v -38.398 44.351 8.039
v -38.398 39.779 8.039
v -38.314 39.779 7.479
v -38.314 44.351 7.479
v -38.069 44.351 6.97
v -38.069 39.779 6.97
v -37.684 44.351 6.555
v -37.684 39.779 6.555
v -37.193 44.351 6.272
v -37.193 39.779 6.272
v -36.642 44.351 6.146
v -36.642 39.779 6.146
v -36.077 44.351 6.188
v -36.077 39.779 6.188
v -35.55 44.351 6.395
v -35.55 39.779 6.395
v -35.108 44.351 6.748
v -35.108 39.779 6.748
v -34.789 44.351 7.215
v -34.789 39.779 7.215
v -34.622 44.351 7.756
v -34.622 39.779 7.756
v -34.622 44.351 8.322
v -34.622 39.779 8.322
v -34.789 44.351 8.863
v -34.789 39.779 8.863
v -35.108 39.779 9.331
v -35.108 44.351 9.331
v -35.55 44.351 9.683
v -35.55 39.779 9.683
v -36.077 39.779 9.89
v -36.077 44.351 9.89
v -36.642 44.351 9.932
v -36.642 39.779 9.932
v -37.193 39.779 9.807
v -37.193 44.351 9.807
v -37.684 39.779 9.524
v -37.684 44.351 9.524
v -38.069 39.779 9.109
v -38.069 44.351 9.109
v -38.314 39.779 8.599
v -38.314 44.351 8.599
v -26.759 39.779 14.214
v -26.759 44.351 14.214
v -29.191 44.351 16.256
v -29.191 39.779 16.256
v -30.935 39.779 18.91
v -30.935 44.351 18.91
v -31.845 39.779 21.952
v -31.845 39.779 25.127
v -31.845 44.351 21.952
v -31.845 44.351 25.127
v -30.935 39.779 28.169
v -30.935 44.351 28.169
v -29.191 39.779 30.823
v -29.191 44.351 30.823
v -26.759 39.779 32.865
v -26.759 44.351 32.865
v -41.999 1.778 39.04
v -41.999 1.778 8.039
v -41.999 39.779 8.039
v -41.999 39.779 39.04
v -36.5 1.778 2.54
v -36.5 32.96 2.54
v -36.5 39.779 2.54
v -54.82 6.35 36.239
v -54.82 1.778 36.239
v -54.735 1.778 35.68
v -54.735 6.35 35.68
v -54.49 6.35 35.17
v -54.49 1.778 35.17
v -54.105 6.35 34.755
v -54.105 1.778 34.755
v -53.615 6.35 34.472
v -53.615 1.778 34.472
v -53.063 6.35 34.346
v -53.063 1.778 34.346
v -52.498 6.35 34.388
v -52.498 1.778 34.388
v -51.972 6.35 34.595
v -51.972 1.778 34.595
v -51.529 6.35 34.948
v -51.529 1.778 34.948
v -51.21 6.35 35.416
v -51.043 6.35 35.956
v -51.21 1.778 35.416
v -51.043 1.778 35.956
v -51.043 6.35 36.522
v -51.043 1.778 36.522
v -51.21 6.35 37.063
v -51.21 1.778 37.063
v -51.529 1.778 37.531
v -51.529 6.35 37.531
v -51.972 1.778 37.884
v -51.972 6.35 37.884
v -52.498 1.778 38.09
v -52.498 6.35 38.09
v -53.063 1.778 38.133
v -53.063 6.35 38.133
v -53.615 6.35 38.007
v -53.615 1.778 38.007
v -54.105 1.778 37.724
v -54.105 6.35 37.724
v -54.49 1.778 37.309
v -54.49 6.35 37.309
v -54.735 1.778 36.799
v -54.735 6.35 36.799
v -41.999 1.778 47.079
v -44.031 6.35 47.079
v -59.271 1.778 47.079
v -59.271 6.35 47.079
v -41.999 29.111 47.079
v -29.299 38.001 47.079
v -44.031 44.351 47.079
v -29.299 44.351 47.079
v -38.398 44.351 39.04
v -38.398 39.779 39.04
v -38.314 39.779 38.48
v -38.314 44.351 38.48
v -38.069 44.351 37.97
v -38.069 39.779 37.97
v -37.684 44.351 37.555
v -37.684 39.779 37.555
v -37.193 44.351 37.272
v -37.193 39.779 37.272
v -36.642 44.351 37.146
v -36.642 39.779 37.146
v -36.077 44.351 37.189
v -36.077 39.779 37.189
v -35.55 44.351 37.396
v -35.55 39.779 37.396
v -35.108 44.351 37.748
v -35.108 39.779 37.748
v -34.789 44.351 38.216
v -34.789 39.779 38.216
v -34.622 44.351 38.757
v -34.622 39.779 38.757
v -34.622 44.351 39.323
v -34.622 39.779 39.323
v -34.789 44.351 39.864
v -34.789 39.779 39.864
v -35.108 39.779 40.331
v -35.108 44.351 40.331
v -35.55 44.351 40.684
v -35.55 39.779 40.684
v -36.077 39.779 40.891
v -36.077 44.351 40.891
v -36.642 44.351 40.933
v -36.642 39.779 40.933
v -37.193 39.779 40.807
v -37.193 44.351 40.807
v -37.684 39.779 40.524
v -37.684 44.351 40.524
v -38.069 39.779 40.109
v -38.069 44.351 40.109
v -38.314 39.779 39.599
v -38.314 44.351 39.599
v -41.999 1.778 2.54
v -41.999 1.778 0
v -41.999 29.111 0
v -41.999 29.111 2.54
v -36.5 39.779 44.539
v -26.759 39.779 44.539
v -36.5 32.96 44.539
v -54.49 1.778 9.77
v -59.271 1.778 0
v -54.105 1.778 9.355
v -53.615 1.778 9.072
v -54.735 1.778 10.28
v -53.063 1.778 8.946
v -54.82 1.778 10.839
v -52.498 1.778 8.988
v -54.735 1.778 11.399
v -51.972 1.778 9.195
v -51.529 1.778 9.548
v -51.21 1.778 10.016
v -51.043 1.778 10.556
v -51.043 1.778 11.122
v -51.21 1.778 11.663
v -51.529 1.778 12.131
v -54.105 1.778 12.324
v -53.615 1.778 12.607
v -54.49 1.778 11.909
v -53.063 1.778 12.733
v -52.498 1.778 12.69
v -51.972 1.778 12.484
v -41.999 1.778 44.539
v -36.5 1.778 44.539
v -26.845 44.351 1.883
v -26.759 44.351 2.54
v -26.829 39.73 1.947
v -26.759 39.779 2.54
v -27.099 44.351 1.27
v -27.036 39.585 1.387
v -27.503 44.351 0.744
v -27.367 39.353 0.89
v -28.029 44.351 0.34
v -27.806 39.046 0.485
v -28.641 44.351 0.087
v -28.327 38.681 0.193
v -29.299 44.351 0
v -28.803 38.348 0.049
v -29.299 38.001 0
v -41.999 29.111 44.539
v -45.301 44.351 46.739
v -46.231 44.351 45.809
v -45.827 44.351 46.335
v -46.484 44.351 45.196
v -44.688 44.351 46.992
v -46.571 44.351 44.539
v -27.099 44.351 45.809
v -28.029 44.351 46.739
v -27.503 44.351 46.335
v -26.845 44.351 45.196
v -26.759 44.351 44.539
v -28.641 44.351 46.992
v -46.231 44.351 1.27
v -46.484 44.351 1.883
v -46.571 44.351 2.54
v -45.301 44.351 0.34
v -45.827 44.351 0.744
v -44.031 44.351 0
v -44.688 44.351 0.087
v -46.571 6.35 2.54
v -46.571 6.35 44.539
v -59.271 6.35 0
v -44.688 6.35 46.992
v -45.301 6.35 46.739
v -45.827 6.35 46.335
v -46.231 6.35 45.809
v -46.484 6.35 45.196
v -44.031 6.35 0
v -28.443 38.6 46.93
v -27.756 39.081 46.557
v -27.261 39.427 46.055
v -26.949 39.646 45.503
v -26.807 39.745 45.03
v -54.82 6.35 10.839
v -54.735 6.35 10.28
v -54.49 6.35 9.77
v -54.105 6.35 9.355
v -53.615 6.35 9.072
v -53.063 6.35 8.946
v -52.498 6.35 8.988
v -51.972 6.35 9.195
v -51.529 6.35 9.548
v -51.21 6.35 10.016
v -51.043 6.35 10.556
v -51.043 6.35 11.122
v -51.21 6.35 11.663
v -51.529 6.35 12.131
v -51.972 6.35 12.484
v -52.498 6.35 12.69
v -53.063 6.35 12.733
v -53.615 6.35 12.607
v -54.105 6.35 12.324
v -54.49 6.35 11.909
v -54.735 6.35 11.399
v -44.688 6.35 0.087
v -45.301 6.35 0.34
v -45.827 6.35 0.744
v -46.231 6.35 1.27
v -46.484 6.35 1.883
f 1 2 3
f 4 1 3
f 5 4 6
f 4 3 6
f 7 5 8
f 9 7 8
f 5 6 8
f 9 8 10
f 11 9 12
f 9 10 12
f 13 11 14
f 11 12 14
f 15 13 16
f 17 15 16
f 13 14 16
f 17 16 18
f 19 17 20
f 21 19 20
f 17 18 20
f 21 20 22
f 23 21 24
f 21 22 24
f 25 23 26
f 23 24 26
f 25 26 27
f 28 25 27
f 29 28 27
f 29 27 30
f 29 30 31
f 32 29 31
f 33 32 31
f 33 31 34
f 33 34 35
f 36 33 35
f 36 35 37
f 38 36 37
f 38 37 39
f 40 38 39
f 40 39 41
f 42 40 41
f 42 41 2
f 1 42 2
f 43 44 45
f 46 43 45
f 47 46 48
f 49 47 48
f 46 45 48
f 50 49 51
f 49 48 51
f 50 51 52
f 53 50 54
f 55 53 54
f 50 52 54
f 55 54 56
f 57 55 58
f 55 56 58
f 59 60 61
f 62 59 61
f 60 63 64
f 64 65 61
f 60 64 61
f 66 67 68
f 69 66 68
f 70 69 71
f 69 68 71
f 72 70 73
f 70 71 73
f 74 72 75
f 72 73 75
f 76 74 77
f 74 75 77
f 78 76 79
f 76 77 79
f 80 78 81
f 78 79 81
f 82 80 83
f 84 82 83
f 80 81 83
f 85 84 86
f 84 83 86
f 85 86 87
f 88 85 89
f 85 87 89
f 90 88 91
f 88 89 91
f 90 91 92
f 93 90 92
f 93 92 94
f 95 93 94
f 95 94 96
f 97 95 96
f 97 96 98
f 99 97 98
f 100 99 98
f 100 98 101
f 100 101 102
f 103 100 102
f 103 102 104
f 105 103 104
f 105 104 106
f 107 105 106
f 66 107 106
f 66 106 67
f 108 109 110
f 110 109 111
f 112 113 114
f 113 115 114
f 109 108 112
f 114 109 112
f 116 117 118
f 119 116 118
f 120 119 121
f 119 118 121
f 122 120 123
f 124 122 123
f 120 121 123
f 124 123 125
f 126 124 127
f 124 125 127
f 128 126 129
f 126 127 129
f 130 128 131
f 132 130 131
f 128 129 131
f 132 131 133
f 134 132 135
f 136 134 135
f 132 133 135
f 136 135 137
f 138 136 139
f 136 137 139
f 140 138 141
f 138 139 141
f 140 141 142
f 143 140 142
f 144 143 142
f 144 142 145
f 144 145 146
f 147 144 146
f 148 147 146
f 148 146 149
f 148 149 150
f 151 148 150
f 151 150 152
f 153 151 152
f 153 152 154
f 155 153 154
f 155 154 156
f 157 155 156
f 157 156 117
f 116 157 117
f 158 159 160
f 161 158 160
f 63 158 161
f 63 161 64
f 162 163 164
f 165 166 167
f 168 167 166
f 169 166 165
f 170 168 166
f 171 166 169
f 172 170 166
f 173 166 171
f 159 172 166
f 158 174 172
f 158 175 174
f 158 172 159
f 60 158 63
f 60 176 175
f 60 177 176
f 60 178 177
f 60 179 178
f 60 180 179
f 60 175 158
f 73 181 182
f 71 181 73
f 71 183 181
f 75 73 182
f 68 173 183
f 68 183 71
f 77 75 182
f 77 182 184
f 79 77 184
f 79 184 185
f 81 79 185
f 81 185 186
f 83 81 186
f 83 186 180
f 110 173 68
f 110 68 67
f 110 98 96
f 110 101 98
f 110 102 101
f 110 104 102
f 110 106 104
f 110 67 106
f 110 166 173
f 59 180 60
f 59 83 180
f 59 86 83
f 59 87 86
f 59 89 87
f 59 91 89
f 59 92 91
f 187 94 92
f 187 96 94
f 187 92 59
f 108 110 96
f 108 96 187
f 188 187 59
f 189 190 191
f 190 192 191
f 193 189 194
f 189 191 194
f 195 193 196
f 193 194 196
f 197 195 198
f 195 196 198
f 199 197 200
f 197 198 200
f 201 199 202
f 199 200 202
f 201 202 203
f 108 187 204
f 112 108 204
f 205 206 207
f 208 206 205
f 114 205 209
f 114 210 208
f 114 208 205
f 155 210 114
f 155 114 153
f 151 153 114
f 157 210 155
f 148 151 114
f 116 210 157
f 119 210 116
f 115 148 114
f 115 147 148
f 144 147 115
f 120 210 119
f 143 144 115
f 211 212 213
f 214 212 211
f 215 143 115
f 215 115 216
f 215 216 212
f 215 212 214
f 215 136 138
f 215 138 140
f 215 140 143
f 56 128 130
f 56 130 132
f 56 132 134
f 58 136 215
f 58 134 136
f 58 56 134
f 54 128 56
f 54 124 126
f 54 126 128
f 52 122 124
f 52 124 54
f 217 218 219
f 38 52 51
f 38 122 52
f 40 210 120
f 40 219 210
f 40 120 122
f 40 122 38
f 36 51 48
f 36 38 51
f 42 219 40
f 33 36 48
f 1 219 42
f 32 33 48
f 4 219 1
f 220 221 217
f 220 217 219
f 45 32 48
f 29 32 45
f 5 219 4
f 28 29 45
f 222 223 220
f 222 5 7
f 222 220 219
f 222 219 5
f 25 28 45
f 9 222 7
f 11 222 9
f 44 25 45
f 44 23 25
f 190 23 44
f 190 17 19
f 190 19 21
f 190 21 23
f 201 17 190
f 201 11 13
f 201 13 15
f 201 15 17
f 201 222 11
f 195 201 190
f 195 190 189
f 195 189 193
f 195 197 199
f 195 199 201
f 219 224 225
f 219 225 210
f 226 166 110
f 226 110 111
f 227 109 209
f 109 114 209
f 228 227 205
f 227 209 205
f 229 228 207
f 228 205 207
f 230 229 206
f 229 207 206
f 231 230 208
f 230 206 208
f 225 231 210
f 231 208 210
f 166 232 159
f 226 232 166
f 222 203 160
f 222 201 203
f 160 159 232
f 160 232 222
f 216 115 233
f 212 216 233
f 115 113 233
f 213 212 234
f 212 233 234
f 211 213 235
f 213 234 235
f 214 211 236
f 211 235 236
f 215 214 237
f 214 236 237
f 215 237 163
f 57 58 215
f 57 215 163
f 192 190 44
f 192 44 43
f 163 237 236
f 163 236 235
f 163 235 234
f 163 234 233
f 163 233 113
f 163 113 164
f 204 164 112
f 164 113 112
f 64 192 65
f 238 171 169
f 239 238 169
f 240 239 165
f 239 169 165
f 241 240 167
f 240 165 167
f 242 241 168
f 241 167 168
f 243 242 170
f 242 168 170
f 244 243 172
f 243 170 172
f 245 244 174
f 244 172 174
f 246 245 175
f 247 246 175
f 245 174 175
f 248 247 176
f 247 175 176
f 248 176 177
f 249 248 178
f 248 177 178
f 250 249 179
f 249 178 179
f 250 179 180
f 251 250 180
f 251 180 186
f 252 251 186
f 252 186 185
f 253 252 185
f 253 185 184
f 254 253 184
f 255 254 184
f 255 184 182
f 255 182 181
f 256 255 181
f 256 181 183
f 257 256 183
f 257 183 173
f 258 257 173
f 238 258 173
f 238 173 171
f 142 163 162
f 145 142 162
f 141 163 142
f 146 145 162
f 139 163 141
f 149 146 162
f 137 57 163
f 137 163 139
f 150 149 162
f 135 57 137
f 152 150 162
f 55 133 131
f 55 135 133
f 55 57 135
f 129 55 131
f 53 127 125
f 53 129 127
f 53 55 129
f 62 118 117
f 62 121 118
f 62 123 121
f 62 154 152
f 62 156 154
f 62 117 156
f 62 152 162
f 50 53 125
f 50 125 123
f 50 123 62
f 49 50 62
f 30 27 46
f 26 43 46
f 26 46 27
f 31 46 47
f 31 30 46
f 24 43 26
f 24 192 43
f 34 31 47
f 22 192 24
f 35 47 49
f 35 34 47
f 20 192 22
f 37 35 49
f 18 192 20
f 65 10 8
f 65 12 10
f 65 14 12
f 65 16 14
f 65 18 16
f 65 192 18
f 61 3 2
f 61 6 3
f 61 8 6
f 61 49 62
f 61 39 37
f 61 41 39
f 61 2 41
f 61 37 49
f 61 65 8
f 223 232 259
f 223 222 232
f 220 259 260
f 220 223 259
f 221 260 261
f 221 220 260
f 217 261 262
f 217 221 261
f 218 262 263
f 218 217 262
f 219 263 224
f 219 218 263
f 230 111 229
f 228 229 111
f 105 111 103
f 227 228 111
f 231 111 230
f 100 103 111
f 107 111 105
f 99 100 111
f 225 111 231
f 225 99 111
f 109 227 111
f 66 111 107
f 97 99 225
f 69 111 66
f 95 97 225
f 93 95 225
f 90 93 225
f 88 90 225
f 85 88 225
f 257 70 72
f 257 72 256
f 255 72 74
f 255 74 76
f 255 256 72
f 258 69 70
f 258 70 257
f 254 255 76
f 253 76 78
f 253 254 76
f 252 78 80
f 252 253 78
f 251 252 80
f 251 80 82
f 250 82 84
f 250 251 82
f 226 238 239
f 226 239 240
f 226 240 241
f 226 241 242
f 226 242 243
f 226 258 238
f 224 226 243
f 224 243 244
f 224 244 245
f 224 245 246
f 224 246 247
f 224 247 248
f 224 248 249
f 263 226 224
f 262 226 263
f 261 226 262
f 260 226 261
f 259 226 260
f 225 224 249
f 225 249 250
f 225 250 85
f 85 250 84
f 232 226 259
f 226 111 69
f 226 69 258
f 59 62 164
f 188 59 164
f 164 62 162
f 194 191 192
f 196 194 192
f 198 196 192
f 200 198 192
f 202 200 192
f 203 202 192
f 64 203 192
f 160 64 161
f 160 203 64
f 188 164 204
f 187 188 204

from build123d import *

# Parameters (mm, degrees)
BOSS_EXTRUDE1_DEPTH   = 47.0789
BOSS_EXTRUDE2_DEPTH   = 2.54
F_6_CLEARANCE_HOLE1_D = 3.7973
CUT_EXTRUDE1_DEPTH    = 87.844214731
FILLET1_R             = 2.54
F_6_CLEARANCE_HOLE2_D = 3.7973
BOSS_EXTRUDE3_DEPTH   = 38.00094


with BuildPart() as part:
    # Sketch1 → Boss-Extrude1 (new body)
    with BuildSketch(Plane.XY):
        Polygon((-59.2709, 1.778), (-59.2709, 6.35), (-46.5709, 6.35), (-46.5709, 44.35094), (-26.7589, 44.35094), (-26.7589, 39.77894), (-41.9989, 39.77894), (-41.9989, 6.35), (-41.9989, 1.778), (-46.5709, 1.778), align=None)
    extrude(amount=BOSS_EXTRUDE1_DEPTH)

    # Sketch2 → Boss-Extrude2 (add)
    with BuildSketch(Plane.XY.offset(47.0789)):
        Polygon((-26.7589, 39.77894), (-41.9989, 29.11094), (-41.9989, 39.77894), align=None)
    boss_extrude2 = extrude(amount=-BOSS_EXTRUDE2_DEPTH)

    # Mirror1: Boss-Extrude2 across plane
    add(boss_extrude2.mirror(Plane(origin=(0, 0, 23.53945), x_dir=(1, 0, 0), z_dir=(0, 0, -1))))

    # #6 Clearance Hole1 (through all)
    with Locations(Plane(origin=(0, 44.35094, 0), x_dir=(1, 0, 0), z_dir=(0, 1, 0))):
        with Locations((-36.4998, -8.0391), (-36.4998, -39.0398)):
            Hole(F_6_CLEARANCE_HOLE1_D / 2)

    # Sketch5 → Cut-Extrude1 (cut, through all)
    with BuildSketch(Plane(origin=(0, 44.35094, 0), x_dir=(1, 0, 0), z_dir=(0, 1, 0))):
        with BuildLine():
            Line((-26.7589, -23.53945), (-26.7589, -14.213831785))
            ThreePointArc((-26.7589, -14.213831785), (-31.96082, -23.53945), (-26.7589, -32.865068215))
            Line((-26.7589, -32.865068215), (-26.7589, -23.53945))
        make_face()
    extrude(amount=-CUT_EXTRUDE1_DEPTH, mode=Mode.SUBTRACT)

    # Fillet1
    fillet1_edges = [part.edges().sort_by_distance(p)[0] for p in [
        (-46.5709, 25.35047, 0),
        (-46.5709, 25.35047, 47.0789),
        (-26.7589, 42.06494, 47.0789),
        (-26.7589, 42.06494, 0),
    ]]
    fillet(fillet1_edges, radius=FILLET1_R)

    # #6 Clearance Hole2 (through all)
    with Locations(Plane(origin=(0, 6.35, 0), x_dir=(1, 0, 0), z_dir=(0, 1, 0))):
        with Locations((-52.9209, -10.83945), (-52.9209, -36.23945)):
            Hole(F_6_CLEARANCE_HOLE2_D / 2)

    # Sketch8 → Boss-Extrude3 (add)
    with BuildSketch(Plane.XZ.offset(-39.77894)):
        Polygon((-41.9989, 44.5389), (-41.9989, 39.0398), (-36.4998, 44.5389), align=None)
        Polygon((-41.9989, 2.54), (-36.4998, 2.54), (-41.9989, 8.0391), align=None)
    extrude(amount=BOSS_EXTRUDE3_DEPTH)


solid = part.part
